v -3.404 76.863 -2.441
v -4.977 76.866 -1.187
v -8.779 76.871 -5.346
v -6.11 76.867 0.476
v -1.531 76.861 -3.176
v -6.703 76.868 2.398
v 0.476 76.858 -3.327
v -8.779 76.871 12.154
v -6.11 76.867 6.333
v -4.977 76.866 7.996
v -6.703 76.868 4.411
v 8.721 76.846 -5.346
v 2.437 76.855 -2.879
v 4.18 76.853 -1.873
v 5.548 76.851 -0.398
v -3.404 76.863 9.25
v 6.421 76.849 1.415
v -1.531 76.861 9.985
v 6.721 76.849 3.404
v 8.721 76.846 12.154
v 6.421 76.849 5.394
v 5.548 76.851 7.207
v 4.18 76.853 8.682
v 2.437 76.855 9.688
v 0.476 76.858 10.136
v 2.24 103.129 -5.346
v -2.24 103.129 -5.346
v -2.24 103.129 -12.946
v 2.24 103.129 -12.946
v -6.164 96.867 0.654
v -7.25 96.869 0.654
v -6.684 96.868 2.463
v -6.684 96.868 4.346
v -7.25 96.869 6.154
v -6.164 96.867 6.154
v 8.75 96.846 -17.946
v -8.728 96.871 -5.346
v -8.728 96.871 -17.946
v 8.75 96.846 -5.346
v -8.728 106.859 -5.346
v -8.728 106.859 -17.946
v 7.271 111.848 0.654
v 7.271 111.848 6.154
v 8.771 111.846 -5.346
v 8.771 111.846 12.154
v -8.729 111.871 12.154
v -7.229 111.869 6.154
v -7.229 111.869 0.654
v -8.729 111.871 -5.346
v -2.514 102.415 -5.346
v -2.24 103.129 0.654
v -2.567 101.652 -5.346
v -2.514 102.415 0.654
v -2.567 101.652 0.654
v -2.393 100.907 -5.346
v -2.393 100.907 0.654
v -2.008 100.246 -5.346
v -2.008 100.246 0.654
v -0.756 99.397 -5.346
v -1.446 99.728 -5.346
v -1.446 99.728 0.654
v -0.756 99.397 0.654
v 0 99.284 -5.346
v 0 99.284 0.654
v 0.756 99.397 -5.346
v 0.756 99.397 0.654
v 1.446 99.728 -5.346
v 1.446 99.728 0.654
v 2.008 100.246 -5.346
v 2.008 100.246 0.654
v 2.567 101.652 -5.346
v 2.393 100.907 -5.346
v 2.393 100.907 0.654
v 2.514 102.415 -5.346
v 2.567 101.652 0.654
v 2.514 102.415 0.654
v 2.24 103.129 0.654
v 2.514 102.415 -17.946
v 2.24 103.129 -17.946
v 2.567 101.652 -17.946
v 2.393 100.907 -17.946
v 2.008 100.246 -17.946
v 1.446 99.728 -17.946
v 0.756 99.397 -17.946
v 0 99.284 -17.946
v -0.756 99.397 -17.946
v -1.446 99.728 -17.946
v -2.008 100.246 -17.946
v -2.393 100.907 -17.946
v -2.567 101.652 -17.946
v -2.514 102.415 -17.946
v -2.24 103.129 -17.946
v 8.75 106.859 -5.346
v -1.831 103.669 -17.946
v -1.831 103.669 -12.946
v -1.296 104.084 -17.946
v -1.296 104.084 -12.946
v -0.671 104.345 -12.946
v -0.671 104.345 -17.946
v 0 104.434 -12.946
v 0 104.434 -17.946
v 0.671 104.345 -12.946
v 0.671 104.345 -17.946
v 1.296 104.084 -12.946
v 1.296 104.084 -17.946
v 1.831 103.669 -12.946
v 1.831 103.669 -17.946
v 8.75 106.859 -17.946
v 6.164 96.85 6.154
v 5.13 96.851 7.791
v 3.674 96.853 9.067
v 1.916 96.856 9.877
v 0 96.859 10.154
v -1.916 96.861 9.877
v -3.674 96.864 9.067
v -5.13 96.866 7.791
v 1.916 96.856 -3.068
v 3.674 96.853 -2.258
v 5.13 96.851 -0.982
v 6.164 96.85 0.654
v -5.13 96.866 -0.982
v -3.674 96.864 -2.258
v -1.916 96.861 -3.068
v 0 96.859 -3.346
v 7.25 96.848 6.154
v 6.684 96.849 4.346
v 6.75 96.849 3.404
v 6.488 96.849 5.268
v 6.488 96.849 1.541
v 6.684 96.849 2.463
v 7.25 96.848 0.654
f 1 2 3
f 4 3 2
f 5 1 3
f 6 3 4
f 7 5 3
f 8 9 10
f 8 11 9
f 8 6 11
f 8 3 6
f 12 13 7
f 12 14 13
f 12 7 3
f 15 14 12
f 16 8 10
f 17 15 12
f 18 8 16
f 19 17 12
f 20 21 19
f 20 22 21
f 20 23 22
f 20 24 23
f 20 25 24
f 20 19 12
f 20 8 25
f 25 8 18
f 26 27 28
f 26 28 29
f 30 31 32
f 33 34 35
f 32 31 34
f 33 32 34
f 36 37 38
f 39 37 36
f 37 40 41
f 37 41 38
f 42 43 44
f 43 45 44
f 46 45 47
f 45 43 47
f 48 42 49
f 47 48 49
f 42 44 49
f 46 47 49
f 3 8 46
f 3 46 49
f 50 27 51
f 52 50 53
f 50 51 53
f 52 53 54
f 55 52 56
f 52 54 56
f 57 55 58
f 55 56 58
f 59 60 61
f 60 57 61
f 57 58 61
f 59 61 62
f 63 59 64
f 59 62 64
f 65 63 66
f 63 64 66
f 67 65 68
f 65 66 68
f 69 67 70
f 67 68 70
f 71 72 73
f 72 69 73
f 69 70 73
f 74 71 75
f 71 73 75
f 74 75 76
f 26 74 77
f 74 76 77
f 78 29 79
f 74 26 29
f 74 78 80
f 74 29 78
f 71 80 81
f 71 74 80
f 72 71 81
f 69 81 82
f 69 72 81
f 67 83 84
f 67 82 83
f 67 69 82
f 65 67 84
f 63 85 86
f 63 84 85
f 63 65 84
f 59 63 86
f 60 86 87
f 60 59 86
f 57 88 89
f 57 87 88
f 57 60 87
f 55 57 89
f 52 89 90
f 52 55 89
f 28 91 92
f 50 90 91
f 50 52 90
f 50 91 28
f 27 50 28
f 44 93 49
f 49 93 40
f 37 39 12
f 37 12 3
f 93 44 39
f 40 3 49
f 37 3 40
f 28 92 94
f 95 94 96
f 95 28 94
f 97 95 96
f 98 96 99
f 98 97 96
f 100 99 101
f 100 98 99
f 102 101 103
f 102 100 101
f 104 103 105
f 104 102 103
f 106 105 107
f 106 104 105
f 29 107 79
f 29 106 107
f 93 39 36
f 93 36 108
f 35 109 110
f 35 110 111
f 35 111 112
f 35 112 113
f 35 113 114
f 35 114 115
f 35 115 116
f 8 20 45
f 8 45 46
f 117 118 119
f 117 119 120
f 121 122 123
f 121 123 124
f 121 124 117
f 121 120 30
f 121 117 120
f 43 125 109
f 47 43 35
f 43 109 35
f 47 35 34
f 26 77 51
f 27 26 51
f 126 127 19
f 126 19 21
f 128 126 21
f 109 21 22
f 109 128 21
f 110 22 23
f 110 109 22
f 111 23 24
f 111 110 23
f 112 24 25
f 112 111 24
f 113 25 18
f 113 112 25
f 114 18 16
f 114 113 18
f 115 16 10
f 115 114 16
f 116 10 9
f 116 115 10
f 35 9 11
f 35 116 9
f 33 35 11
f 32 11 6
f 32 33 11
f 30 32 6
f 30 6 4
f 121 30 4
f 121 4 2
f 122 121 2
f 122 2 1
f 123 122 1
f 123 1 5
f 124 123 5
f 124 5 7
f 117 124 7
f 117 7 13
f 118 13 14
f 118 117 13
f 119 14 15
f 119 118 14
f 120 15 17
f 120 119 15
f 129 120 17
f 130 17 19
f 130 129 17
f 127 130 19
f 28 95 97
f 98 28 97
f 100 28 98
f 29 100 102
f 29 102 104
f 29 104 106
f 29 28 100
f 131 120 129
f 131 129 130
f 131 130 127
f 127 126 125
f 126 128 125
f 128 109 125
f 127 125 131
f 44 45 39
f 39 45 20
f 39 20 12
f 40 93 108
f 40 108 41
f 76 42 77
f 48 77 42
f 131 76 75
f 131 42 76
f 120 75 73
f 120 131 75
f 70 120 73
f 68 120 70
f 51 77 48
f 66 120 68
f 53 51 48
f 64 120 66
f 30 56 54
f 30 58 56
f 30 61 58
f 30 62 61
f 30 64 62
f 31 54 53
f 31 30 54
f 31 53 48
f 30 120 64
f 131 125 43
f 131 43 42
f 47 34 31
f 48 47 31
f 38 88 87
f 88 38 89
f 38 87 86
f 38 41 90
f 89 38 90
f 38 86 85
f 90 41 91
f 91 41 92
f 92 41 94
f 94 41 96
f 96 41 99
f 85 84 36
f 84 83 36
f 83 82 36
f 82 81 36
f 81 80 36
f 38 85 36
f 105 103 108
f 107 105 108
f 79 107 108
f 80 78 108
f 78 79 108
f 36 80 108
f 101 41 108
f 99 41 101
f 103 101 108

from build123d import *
from build123d.topology import SkipClean

# Parameters (mm, degrees)
SKETCH3_W           = 17.5
SKETCH3_H           = 17.5
SKETCH3_R           = 6.75
BOSS_EXTRUDE2_DEPTH = 20
BOSS_EXTRUDE1_DEPTH = 12.6
SKETCH4_W           = 17.5
SKETCH4_H           = 17.5
SKETCH4_W_2         = 14.5
SKETCH4_H_2         = 5.5
BOSS_EXTRUDE3_DEPTH = 15
CUT_EXTRUDE1_START  = -5
SKETCH2_R           = 2.575
CUT_EXTRUDE1_DEPTH  = 5
CUT_EXTRUDE2_START  = -18.6
CUT_EXTRUDE2_DEPTH  = 18.6


with BuildPart() as part:
    # Sketch3 → Boss-Extrude2 (new body)
    with BuildSketch(Plane(origin=(0, 96.858578644, 4.362132034), x_dir=(0.999998975550975, -0.0014313968704513535, 0), z_dir=(-0.0014313968704513535, -0.999998975550975, 0))):
        with Locations((0, -0.957655346)):
            Rectangle(SKETCH3_W, SKETCH3_H)
        with Locations((0, -0.957655346)):
            Circle(SKETCH3_R, mode=Mode.SUBTRACT)
    extrude(amount=BOSS_EXTRUDE2_DEPTH)



with BuildPart() as body_2:
    # Sketch1 → Boss-Extrude1 (new body)
    with BuildSketch(Plane.XY.offset(-5.345523312)):
        Polygon((-8.728127561, 96.871072071), (8.749991036, 96.846053921), (8.749991036, 106.858578644), (-8.728127561, 106.858578644), align=None)
        with BuildLine():
            Line((-2.24, 103.128627855), (2.24, 103.128627855))
            ThreePointArc((2.24, 103.128627855), (0, 99.283578644), (-2.24, 103.128627855))
        make_face(mode=Mode.SUBTRACT)
    extrude(amount=-BOSS_EXTRUDE1_DEPTH)


with BuildPart() as part_1:
    add(part.part)

    add(body_2.part)  # Boss-Extrude3 merges body 2
    # Sketch4 → Boss-Extrude3 (add)
    with BuildSketch(Plane(origin=(-0.06932148, 96.85867787, 0), x_dir=(-0.9999989755509748, 0.0014313968704517323, 0), z_dir=(-0.0014313968704517323, -0.999998975550975, 0))):
        with Locations((-0.069321551, -3.404476688)):
            Rectangle(SKETCH4_W, SKETCH4_H)
        with Locations((-0.069321551, -3.404476688)):
            Rectangle(SKETCH4_W_2, SKETCH4_H_2, mode=Mode.SUBTRACT)
    extrude(amount=-BOSS_EXTRUDE3_DEPTH)

    # Sketch2 → Cut-Extrude1 (cut)
    with BuildSketch(Plane(origin=(0, 0, -17.945523312), x_dir=(-1, 0, 0), z_dir=(0, 0, -1)).offset(CUT_EXTRUDE1_START)):
        with Locations(Location((0, 101.858578644, 0), (0, 0, 180))):
            Circle(SKETCH2_R)
    extrude(amount=CUT_EXTRUDE1_DEPTH, mode=Mode.SUBTRACT)

    # Sketch5 → Cut-Extrude2 (cut)
    with SkipClean():  # the faces are left unmerged after this step: merging them gives an invalid solid
        with BuildSketch(Plane(origin=(0, 0, -17.945523312), x_dir=(-1, 0, 0), z_dir=(0, 0, -1)).offset(CUT_EXTRUDE2_START)):
            with BuildLine():
                Line((-2.24, 103.128627855), (2.24, 103.128627855))
                ThreePointArc((2.24, 103.128627855), (0, 99.283578644), (-2.24, 103.128627855))
            make_face()
        extrude(amount=CUT_EXTRUDE2_DEPTH, mode=Mode.SUBTRACT)


solid = part_1.part
